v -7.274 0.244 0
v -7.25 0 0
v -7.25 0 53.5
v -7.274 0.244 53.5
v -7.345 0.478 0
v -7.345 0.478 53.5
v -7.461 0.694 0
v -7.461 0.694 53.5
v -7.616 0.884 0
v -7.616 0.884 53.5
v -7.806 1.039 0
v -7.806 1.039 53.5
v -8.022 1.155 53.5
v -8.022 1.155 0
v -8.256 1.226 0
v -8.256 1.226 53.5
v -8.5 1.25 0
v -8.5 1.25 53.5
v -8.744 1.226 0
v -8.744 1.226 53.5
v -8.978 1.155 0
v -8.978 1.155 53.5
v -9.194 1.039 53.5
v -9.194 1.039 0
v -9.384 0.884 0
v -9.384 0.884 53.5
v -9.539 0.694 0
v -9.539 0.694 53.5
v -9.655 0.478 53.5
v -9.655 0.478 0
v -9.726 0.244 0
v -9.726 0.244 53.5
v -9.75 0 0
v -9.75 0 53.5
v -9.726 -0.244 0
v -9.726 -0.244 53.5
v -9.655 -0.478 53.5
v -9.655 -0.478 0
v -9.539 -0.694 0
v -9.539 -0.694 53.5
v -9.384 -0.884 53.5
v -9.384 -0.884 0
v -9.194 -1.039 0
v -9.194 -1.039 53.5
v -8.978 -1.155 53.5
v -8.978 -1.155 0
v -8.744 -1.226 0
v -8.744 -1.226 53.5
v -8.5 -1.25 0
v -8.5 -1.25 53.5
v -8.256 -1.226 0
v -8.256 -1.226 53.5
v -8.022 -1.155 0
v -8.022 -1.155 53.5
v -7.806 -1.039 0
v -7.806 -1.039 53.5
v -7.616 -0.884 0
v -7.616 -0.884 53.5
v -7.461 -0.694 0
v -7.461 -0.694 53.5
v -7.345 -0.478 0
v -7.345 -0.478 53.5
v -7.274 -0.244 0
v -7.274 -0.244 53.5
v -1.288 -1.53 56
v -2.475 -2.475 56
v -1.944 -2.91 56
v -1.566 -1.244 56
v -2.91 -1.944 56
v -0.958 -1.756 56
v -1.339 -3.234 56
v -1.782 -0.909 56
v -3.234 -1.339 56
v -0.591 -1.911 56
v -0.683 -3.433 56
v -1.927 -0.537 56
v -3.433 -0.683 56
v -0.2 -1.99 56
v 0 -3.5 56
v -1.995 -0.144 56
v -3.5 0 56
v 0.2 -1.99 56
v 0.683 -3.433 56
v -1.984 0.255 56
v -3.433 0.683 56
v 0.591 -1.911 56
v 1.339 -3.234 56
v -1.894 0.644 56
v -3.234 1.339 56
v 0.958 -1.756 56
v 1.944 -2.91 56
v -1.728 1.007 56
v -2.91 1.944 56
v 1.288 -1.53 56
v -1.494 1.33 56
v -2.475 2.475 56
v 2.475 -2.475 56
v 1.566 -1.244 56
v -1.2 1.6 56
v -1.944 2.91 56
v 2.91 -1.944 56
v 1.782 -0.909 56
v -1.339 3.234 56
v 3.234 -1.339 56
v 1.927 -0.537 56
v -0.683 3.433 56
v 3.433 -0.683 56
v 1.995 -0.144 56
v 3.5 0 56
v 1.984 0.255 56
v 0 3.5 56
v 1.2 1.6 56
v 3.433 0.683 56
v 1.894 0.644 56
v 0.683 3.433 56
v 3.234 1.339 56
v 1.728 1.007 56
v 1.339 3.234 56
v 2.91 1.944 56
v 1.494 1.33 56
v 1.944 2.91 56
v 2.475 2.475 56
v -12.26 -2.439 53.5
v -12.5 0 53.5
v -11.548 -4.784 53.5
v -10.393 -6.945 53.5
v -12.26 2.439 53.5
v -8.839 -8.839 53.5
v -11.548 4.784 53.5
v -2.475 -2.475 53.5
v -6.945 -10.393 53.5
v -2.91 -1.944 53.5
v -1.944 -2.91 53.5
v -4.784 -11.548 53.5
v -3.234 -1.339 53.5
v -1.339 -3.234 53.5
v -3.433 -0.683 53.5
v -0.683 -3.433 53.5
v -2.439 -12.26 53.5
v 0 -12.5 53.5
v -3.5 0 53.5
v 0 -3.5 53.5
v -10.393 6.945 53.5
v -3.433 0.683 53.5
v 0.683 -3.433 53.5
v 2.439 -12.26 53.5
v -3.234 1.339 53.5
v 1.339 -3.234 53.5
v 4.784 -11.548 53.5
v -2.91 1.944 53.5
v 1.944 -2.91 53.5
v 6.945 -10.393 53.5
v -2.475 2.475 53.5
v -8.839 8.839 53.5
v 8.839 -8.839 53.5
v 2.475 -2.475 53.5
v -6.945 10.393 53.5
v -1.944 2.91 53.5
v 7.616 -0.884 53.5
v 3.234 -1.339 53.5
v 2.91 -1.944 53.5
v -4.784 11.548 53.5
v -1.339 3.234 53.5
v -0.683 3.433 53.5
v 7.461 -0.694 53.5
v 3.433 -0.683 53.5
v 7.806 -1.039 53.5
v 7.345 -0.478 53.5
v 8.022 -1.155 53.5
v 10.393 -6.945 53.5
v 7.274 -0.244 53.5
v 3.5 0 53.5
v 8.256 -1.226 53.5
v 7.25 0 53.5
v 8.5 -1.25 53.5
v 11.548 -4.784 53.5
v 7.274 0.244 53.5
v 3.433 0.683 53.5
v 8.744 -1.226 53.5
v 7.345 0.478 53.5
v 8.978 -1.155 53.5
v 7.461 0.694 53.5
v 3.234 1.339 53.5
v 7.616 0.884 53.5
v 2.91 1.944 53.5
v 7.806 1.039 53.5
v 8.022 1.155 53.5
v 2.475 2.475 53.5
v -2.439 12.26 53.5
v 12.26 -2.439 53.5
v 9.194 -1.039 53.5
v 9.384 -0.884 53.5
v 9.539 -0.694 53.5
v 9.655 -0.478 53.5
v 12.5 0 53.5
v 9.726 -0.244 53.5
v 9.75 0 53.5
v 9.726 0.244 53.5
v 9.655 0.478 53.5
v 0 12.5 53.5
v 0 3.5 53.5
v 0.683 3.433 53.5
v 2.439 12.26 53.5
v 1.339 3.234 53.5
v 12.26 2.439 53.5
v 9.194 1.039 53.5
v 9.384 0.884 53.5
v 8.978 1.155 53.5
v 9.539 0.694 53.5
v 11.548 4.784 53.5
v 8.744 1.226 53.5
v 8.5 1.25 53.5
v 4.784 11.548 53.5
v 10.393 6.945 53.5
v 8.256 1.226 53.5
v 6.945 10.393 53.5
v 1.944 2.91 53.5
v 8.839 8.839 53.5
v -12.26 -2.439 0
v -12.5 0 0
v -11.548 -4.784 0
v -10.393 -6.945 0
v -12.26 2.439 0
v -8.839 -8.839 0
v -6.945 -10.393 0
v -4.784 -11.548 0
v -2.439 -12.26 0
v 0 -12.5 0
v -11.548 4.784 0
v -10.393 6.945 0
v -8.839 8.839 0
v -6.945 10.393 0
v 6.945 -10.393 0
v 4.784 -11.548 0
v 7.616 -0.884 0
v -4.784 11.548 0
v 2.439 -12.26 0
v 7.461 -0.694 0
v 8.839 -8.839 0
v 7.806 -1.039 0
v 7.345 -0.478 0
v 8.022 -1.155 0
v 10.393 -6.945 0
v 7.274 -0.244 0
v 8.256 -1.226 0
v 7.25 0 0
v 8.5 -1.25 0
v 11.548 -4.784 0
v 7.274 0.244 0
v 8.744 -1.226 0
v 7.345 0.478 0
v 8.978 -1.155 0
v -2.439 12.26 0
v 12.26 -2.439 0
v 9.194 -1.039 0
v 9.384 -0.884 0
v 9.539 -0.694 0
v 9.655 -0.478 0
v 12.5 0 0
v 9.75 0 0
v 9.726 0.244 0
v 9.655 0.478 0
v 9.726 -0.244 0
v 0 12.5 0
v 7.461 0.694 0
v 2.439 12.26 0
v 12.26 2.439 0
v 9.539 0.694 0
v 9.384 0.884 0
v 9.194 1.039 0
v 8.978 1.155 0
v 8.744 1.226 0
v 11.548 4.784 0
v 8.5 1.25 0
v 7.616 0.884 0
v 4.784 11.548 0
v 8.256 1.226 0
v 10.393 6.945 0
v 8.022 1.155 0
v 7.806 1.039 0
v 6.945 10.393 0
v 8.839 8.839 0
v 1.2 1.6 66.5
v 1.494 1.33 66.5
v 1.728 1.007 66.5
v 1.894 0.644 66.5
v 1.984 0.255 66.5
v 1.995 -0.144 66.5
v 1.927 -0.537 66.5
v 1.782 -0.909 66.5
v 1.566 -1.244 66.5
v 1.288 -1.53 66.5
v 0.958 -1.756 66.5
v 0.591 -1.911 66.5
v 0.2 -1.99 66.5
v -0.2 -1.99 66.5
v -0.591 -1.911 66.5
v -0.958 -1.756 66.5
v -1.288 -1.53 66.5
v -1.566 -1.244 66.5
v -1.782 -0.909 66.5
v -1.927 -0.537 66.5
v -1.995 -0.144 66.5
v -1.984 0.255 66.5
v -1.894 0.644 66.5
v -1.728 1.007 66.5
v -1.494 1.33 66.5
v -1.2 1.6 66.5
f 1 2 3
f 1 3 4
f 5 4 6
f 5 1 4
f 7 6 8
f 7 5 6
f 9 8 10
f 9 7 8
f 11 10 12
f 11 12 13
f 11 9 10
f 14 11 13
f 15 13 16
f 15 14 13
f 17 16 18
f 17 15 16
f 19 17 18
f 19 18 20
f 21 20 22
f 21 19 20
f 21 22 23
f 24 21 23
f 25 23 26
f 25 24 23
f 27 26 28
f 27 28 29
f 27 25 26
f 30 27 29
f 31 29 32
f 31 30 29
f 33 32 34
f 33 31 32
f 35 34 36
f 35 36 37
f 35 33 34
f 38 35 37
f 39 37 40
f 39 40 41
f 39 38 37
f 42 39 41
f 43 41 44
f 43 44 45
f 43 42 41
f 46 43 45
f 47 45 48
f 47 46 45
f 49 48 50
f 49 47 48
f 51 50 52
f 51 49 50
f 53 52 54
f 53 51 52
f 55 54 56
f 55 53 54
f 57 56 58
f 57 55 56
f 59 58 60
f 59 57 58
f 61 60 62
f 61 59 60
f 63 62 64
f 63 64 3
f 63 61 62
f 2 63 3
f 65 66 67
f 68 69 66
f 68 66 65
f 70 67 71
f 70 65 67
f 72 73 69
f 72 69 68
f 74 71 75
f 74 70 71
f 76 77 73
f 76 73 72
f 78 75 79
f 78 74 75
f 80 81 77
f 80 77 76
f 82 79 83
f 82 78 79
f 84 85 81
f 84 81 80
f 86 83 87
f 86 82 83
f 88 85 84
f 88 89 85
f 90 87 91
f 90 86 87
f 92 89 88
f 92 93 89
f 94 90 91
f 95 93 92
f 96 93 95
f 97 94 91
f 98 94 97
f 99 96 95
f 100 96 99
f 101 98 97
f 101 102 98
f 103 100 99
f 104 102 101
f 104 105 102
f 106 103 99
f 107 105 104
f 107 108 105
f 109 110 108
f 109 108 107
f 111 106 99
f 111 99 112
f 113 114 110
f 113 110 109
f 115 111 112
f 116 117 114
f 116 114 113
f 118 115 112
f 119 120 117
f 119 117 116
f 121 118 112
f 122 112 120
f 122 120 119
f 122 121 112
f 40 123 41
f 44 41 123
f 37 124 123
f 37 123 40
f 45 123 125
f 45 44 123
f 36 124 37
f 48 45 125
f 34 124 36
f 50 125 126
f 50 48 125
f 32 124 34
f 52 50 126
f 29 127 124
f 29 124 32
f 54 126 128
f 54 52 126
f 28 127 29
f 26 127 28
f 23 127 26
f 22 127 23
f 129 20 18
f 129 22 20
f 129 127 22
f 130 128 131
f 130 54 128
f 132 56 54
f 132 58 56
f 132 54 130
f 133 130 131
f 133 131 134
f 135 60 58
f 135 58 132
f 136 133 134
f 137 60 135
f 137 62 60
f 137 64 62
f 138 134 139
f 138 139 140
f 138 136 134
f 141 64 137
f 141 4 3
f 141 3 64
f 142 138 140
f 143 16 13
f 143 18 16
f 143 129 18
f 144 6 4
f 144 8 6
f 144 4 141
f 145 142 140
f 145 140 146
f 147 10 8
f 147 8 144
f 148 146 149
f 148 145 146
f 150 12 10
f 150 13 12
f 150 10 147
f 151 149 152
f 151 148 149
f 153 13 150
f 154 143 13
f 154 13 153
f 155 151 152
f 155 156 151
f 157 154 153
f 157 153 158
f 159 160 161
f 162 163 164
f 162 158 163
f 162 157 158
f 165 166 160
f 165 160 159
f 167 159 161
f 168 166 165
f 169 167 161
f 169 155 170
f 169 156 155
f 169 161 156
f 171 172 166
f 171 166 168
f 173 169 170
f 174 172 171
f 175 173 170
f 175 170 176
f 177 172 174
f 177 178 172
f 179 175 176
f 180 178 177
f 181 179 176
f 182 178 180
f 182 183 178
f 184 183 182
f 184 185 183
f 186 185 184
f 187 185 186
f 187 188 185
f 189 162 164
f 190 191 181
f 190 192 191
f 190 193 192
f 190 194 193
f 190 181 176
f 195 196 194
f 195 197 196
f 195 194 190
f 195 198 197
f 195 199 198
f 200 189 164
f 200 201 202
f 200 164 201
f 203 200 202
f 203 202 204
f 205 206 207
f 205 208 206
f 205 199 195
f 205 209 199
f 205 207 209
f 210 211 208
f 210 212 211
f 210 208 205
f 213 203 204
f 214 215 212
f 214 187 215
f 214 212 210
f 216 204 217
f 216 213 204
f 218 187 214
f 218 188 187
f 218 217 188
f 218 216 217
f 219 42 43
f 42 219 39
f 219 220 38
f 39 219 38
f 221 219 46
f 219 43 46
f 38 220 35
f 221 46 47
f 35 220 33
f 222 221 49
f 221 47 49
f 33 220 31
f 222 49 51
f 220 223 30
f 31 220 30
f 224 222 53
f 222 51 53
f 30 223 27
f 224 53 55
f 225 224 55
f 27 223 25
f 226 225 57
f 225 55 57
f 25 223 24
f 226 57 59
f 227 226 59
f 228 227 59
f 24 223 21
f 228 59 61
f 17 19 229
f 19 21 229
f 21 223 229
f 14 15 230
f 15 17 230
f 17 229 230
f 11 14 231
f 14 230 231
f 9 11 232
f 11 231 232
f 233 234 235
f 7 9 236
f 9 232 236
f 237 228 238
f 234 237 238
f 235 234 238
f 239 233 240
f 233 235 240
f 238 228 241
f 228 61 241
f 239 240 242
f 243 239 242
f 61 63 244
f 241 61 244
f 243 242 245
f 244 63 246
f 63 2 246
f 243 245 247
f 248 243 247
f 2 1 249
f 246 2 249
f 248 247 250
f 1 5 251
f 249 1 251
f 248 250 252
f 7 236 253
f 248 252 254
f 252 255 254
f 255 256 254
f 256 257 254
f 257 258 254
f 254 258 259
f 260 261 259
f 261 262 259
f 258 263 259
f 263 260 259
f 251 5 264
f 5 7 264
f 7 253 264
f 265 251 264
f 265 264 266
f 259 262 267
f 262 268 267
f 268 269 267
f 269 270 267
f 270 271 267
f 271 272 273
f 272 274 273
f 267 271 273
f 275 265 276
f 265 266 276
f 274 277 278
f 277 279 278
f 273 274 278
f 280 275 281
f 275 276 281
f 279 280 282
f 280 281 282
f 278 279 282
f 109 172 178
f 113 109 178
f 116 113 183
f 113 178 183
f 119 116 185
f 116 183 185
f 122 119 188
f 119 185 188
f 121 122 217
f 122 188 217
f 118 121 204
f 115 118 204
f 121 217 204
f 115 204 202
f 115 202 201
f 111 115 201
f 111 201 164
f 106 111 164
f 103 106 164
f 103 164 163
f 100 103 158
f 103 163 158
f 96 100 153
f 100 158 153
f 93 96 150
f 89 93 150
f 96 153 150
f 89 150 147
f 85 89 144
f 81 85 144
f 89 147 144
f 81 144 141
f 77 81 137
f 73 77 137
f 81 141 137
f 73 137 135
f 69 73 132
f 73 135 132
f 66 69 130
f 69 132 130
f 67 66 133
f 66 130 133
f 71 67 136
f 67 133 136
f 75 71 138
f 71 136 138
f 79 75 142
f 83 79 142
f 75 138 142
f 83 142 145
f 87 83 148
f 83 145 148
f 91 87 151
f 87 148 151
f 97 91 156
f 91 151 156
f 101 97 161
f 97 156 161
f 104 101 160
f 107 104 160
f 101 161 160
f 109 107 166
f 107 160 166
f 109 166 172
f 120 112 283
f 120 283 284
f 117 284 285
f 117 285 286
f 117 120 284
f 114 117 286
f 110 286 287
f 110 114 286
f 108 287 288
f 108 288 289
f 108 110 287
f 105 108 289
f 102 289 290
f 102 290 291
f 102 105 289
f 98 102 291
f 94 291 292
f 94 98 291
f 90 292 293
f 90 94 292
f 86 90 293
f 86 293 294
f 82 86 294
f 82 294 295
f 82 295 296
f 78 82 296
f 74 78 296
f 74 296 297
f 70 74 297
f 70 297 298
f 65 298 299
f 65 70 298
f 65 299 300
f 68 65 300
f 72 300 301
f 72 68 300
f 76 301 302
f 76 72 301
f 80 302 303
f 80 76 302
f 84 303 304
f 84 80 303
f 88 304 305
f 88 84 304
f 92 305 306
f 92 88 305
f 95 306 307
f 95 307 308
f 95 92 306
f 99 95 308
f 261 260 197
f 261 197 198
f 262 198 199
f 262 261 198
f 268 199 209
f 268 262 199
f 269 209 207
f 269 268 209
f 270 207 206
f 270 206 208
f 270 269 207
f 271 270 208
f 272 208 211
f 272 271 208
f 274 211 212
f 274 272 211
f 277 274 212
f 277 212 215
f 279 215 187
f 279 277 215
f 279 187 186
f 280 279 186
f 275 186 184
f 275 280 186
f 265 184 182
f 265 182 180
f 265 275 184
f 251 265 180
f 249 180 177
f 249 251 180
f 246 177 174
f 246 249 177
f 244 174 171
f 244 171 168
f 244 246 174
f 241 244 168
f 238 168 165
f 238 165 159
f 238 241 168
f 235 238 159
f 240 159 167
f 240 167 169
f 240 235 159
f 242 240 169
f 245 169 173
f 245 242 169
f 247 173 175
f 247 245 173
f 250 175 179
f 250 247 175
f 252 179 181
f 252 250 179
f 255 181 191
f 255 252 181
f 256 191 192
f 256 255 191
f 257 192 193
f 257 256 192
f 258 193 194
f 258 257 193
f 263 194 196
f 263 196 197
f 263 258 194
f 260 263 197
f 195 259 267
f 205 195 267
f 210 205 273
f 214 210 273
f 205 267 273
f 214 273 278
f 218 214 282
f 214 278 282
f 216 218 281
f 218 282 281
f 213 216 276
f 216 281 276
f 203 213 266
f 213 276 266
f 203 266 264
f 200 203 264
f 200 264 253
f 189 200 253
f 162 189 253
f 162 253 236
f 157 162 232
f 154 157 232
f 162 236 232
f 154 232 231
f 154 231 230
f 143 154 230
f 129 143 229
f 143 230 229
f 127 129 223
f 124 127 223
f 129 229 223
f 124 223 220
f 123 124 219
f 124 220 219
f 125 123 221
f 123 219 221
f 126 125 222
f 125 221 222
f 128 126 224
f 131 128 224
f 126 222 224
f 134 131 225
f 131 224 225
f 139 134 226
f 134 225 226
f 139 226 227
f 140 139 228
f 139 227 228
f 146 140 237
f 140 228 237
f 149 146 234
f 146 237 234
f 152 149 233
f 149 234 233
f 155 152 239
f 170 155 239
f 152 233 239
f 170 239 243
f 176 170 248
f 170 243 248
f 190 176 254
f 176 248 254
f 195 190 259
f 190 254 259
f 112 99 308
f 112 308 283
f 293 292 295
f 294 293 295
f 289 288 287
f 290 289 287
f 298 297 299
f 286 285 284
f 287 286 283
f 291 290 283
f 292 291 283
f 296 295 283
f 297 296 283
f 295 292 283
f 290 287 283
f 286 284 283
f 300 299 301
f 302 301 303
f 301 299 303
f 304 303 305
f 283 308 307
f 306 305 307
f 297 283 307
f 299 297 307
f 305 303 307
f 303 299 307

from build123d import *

# Parameters (mm, degrees)
SKETCH1_R           = 12.5
SKETCH1_R_2         = 1.25
BOSS_EXTRUDE1_DEPTH = 53.5
SKETCH2_R           = 3.5
BOSS_EXTRUDE2_DEPTH = 2.5
BOSS_EXTRUDE3_DEPTH = 10.5


with BuildPart() as part:
    # Sketch1 → Boss-Extrude1 (new body)
    with BuildSketch(Plane.XY):
        Circle(SKETCH1_R)
        with Locations((-8.5, 0)):
            Circle(SKETCH1_R_2, mode=Mode.SUBTRACT)
        with Locations((8.5, 0)):
            Circle(SKETCH1_R_2, mode=Mode.SUBTRACT)
    extrude(amount=BOSS_EXTRUDE1_DEPTH)

    # Sketch2 → Boss-Extrude2 (add)
    with BuildSketch(Plane.XY.offset(53.5)):
        Circle(SKETCH2_R)
    extrude(amount=BOSS_EXTRUDE2_DEPTH)

    # Sketch3 → Boss-Extrude3 (add)
    with BuildSketch(Plane.XY.offset(56)):
        with BuildLine():
            Line((-1.2, 1.6), (1.2, 1.6))
            ThreePointArc((1.2, 1.6), (0, -2), (-1.2, 1.6))
        make_face()
    extrude(amount=BOSS_EXTRUDE3_DEPTH)


solid = part.part
